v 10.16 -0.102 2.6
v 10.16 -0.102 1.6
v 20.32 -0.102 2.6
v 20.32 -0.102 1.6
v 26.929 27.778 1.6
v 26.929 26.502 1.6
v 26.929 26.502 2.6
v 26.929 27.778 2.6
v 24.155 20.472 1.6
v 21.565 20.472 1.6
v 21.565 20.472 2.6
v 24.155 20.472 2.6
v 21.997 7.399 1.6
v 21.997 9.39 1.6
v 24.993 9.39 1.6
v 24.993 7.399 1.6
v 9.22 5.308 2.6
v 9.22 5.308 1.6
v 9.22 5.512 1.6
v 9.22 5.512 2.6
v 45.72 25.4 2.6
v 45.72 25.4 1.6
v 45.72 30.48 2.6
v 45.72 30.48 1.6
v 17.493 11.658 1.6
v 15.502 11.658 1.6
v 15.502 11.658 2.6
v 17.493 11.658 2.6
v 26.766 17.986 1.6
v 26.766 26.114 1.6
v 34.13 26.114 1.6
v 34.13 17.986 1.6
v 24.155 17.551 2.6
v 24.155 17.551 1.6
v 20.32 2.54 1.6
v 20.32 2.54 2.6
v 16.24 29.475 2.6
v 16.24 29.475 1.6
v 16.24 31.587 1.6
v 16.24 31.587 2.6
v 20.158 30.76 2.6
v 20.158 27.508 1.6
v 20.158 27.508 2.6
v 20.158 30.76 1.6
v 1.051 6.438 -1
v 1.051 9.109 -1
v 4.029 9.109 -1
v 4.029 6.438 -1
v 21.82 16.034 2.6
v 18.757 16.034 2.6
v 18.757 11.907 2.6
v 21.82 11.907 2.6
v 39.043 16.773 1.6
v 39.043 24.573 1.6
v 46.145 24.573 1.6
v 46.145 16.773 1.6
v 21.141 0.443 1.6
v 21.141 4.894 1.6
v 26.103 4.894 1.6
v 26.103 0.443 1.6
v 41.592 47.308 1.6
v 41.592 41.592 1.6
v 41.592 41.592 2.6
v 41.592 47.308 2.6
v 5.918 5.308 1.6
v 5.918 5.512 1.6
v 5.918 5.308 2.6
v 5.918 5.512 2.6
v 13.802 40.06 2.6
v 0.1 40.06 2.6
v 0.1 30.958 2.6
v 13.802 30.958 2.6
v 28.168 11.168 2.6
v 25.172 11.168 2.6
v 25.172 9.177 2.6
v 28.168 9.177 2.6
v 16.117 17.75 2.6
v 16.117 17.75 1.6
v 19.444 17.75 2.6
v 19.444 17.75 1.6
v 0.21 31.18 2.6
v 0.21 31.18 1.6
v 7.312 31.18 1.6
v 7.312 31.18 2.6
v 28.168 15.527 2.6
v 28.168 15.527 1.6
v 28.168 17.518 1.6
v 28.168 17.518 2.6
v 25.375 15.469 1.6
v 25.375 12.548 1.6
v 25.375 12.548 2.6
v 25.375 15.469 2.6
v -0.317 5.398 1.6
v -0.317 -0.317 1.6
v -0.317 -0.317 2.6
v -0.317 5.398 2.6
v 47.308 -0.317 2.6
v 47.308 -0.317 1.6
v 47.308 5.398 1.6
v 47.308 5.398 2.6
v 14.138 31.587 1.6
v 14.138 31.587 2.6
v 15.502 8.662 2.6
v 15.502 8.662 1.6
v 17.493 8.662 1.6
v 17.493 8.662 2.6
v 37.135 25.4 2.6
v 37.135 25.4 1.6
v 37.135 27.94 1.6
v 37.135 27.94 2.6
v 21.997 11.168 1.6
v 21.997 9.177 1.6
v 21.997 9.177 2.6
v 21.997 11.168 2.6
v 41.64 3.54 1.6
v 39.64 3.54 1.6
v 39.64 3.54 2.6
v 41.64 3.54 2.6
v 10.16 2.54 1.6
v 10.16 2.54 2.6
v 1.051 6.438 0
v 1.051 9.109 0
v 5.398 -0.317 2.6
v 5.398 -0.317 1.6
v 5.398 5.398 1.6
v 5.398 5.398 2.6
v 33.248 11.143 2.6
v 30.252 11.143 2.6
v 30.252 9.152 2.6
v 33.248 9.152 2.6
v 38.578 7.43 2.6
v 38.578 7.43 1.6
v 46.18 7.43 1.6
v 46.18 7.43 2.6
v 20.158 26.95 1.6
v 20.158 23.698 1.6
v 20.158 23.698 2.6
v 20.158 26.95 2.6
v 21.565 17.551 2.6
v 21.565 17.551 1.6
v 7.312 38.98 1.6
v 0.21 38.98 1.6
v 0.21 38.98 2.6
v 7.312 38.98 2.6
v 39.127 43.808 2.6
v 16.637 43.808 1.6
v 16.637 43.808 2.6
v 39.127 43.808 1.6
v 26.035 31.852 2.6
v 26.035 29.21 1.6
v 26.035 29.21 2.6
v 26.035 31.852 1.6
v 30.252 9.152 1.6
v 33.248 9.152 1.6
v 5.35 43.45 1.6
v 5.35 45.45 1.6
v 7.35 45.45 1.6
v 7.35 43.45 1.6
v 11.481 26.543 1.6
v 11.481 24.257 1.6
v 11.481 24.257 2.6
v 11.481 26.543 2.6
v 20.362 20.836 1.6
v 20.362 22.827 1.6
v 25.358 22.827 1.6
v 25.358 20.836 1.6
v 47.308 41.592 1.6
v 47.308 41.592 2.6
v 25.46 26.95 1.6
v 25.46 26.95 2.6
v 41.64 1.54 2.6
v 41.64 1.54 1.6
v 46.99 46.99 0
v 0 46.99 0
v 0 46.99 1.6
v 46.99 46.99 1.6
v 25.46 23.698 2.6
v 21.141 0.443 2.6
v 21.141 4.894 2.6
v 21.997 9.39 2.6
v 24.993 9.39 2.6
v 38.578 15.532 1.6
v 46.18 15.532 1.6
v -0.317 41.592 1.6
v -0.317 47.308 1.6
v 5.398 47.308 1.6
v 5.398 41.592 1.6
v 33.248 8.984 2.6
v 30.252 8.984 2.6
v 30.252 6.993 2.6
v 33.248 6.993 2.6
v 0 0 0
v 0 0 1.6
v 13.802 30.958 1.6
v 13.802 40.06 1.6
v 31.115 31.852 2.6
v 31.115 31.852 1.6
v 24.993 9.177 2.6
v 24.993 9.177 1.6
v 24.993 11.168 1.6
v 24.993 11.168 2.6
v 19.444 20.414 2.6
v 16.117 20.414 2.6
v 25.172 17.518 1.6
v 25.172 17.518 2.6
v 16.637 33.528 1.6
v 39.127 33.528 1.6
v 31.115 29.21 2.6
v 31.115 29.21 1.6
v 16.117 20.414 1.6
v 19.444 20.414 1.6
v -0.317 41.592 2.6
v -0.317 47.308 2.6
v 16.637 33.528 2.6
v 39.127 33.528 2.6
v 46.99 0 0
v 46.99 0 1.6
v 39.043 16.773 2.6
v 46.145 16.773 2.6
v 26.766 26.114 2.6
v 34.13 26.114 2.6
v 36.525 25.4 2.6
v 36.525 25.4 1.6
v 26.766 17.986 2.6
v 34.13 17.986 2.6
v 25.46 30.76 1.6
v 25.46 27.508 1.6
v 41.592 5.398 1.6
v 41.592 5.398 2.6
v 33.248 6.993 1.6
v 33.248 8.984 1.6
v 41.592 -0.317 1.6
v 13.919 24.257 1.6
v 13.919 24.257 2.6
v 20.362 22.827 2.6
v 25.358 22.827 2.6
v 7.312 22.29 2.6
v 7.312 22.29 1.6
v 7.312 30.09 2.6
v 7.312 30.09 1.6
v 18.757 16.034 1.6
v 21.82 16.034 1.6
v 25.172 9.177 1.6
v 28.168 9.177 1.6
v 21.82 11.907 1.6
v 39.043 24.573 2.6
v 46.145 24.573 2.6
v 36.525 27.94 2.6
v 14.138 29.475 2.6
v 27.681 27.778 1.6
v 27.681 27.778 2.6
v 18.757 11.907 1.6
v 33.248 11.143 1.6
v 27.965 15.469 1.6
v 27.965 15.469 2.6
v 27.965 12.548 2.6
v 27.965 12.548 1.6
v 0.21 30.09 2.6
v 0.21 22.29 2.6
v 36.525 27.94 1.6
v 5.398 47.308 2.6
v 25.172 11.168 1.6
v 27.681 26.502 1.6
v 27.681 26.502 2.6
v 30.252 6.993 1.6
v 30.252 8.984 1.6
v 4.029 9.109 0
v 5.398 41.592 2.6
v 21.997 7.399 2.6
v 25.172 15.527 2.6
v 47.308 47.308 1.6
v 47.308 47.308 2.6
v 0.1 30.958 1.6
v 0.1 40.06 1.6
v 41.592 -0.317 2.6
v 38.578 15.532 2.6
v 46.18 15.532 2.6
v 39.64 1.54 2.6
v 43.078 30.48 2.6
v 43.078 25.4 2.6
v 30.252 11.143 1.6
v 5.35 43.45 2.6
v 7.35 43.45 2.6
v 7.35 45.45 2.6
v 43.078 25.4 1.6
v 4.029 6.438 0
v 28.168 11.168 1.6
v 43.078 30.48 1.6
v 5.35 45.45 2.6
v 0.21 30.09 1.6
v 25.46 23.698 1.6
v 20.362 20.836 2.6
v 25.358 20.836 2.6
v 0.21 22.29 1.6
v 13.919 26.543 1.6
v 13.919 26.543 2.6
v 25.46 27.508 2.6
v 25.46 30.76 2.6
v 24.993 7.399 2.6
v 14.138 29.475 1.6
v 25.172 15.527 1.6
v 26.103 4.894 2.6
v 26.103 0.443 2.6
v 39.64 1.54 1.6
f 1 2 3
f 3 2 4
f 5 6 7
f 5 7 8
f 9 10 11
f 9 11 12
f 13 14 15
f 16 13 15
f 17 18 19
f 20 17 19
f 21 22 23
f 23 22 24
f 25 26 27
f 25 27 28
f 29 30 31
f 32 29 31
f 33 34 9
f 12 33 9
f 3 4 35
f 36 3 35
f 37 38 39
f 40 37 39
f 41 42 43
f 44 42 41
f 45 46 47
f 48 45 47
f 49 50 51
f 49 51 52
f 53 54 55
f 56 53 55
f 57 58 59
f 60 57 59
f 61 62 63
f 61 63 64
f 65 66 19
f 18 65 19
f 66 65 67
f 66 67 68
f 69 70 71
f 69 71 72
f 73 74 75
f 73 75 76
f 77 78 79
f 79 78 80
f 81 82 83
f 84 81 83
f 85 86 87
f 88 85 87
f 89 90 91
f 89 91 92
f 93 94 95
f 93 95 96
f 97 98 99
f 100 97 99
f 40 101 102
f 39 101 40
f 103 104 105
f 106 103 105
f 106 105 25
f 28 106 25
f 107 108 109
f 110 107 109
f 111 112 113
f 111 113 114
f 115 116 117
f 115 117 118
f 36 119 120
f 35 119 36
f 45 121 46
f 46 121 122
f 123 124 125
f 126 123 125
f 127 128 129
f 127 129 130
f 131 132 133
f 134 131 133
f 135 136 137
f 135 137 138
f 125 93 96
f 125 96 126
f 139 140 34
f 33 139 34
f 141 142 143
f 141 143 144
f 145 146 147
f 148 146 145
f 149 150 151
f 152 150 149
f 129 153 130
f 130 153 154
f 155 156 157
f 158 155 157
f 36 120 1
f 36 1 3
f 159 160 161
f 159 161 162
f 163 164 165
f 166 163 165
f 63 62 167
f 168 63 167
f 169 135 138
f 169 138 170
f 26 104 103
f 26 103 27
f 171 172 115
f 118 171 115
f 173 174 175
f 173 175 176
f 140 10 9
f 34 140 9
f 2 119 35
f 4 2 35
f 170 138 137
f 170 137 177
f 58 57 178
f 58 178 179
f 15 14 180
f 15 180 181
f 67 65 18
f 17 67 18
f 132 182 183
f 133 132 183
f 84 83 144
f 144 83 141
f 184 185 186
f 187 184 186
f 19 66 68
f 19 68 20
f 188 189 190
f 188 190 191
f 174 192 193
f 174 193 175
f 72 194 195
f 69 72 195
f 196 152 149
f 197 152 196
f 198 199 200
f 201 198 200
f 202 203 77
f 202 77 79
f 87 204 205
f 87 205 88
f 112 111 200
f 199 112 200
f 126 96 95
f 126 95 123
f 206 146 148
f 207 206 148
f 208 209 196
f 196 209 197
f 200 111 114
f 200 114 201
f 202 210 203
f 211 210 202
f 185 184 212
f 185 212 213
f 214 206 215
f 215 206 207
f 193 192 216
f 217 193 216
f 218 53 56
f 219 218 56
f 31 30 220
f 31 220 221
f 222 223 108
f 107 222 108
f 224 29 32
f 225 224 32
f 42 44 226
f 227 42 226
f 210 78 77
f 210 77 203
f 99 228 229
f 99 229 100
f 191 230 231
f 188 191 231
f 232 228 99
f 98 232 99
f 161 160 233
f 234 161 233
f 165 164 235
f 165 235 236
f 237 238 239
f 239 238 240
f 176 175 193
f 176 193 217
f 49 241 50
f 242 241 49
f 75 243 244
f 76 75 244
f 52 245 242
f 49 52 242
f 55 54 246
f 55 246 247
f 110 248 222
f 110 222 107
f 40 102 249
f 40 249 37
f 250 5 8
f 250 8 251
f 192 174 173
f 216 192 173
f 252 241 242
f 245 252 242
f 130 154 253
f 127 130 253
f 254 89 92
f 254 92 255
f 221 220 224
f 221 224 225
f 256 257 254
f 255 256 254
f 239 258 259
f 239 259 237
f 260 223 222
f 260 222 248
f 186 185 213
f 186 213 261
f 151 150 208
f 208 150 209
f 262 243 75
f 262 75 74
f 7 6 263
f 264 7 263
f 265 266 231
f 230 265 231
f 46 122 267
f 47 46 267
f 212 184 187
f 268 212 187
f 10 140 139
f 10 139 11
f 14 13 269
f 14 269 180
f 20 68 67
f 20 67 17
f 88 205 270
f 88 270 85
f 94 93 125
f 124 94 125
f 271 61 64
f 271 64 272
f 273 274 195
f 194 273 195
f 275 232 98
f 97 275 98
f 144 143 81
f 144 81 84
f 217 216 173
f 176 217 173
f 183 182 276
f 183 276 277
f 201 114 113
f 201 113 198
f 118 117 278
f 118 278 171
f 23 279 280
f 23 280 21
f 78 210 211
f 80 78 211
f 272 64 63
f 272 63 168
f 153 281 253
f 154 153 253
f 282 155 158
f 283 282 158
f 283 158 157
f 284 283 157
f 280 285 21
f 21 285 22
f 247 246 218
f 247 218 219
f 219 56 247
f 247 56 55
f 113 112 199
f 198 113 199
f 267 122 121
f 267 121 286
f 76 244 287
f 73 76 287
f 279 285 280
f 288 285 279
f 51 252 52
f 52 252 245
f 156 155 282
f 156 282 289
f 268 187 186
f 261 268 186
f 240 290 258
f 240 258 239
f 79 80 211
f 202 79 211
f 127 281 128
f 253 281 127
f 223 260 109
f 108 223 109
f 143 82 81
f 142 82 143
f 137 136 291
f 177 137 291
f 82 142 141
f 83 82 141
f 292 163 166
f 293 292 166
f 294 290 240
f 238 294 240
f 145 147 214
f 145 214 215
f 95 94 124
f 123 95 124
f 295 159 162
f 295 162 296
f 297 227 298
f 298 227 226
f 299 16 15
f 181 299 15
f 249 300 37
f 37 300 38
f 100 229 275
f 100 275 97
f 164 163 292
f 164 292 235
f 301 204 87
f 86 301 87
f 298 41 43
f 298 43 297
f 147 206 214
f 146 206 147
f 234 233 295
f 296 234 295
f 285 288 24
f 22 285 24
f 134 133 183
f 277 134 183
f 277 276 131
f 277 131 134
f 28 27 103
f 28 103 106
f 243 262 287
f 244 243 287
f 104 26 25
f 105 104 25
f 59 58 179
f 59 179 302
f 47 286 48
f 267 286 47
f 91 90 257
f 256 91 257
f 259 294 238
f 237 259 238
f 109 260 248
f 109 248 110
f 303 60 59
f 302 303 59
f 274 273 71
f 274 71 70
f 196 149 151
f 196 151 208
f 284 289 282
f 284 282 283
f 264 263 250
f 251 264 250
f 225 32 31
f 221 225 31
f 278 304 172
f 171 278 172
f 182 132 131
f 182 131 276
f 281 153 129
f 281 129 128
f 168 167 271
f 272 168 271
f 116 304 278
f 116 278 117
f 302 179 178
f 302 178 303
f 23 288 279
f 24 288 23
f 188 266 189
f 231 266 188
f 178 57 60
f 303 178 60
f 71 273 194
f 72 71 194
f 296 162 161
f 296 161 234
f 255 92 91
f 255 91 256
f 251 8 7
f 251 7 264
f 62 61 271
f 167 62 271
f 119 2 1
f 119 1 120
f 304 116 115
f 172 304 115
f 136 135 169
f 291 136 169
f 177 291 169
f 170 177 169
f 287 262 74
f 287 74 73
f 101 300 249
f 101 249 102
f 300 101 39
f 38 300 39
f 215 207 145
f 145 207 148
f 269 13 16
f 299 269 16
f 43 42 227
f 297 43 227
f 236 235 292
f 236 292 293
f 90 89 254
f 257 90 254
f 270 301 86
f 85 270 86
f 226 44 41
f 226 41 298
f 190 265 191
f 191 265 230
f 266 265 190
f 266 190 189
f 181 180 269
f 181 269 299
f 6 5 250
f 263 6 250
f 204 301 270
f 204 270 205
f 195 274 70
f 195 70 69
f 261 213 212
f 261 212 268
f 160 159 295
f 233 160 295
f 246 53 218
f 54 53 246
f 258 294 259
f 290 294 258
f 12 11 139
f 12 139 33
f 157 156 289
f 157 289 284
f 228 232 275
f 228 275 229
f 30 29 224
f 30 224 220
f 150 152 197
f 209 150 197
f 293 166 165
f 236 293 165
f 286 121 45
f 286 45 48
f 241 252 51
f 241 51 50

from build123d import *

# Parameters (mm, degrees)
SKETCH1_W                            = 46.99
SKETCH1_H                            = 46.99
BOARD_DEPTH                          = 1.6
SKETCH2_W                            = 3.327
SKETCH2_H                            = 2.6635
EXTRUDE_1210_1_DEPTH                 = 1
SKETCH3_W                            = 4.9968
SKETCH3_H                            = 1.9914
EXTRUDE_1206_1_DEPTH                 = 1
SKETCH4_W                            = 5.3016
SKETCH4_H                            = 3.2516
EIA3528_1_DEPTH                      = 1
SKETCH5_W                            = 5.3016
SKETCH5_H                            = 3.2516
EIA3528_2_DEPTH                      = 1
SKETCH6_W                            = 2.9968
SKETCH6_H                            = 1.9914
F_0603_CAP_1_DEPTH                   = 1
SKETCH7_W                            = 1.9914
SKETCH7_H                            = 2.9968
F_0603_CAP_2_DEPTH                   = 1
SKETCH8_W                            = 2.5908
SKETCH8_H                            = 2.921
SOT23_1_DEPTH                        = 1
SKETCH9_W                            = 2.5908
SKETCH9_H                            = 2.921
SOT23_2_DEPTH                        = 1
SKETCH10_W                           = 2
SKETCH10_H                           = 2
FIDUCIAL_1X2_1_DEPTH                 = 1
SKETCH11_W                           = 2
SKETCH11_H                           = 2
FIDUCIAL_1X2_2_DEPTH                 = 1
SKETCH14_W                           = 13.7016
SKETCH14_H                           = 9.1016
POWER_JACK_PTH_1_DEPTH               = 1
SKETCH15_W                           = 7.6016
SKETCH15_H                           = 8.1016
JST_2_SMD_1_DEPTH                    = 1
SKETCH16_W                           = 10.16
SKETCH16_H                           = 2.6416
EXTRUDE_1X04_1_DEPTH                 = 1
SKETCH17_W                           = 2.6416
SKETCH17_H                           = 5.08
EXTRUDE_1X02_1_DEPTH                 = 1
SKETCH18_W                           = 7.1016
SKETCH18_H                           = 7.8
SCREWTERMINAL_3_5MM_2_1_DEPTH        = 1
SKETCH19_W                           = 7.1016
SKETCH19_H                           = 7.8
SCREWTERMINAL_3_5MM_2_2_DEPTH        = 1
SKETCH20_W                           = 7.1016
SKETCH20_H                           = 7.8
SCREWTERMINAL_3_5MM_2_3_DEPTH        = 1
SKETCH21_W                           = 2.4384
SKETCH21_H                           = 2.286
SJ_2S_1_DEPTH                        = 1
SKETCH22_W                           = 2.1016
SKETCH22_H                           = 2.1115
SJ_2S_NO_1_DEPTH                     = 1
SKETCH23_W                           = 0.6096
SKETCH23_H                           = 2.54
PTH_JUMPER_NC_BOTTOM_NO_SILK_1_DEPTH = 1
SKETCH24_W                           = 5.08
SKETCH24_H                           = 2.6416
EXTRUDE_1X02_2_DEPTH                 = 1
SKETCH25_W                           = 7.3635
SKETCH25_H                           = 8.127
CR75_1_DEPTH                         = 1
SKETCH26_W                           = 22.49
SKETCH26_H                           = 10.28
SFE_LOGO_NAME_FLAME_2_1_DEPTH        = 1
SKETCH27_W                           = 4.9628
SKETCH27_H                           = 4.4514
OSHW_LOGO_M_1_DEPTH                  = 1
SKETCH28_W                           = 2.9776
SKETCH28_H                           = 2.6708
OSHW_LOGO_S_1_DEPTH                  = 1
SKETCH30_W                           = 0.7524
SKETCH30_H                           = 1.2762
EXTRUDE_0805_1_DEPTH                 = 1
SKETCH31_W                           = 2.9968
SKETCH31_H                           = 1.9914
F_0603_RES_1_DEPTH                   = 1
SKETCH32_W                           = 2.9968
SKETCH32_H                           = 1.9914
F_0603_RES_2_DEPTH                   = 1
SKETCH33_W                           = 2.9968
SKETCH33_H                           = 1.9914
F_0603_RES_3_DEPTH                   = 1
SKETCH34_W                           = 2.9968
SKETCH34_H                           = 1.9914
F_0603_RES_4_DEPTH                   = 1
SKETCH35_W                           = 2.9968
SKETCH35_H                           = 1.9914
F_0603_RES_5_DEPTH                   = 1
SKETCH36_W                           = 3.3016
SKETCH36_H                           = 0.2032
TRIMPOT_3MM_1_DEPTH                  = 1
SKETCH37_W                           = 5.715
SKETCH37_H                           = 5.715
STAND_OFF_1_DEPTH                    = 1
SKETCH38_W                           = 5.715
SKETCH38_H                           = 5.715
STAND_OFF_2_DEPTH                    = 1
SKETCH39_W                           = 5.715
SKETCH39_H                           = 5.715
STAND_OFF_3_DEPTH                    = 1
SKETCH40_W                           = 5.715
SKETCH40_H                           = 5.715
STAND_OFF_4_DEPTH                    = 1
SKETCH41_W                           = 3.0635
SKETCH41_H                           = 4.127
MSOP_12_GND_1_DEPTH                  = 1


with BuildPart() as part:
    # Sketch1 → BOARD (new body)
    with BuildSketch(Plane.XY):
        with Locations((23.495, 23.495)):
            Rectangle(SKETCH1_W, SKETCH1_H)
    extrude(amount=BOARD_DEPTH)


with BuildPart() as body_2:
    # Sketch2 → 1210-1 (new body)
    with BuildSketch(Plane.XY.offset(1.6)):
        with Locations((17.78, 19.08175)):
            Rectangle(SKETCH2_W, SKETCH2_H)
    extrude(amount=EXTRUDE_1210_1_DEPTH)


with BuildPart() as body_3:
    # Sketch3 → 1206-1 (new body)
    with BuildSketch(Plane.XY.offset(1.6)):
        with Locations((22.86, 21.8313)):
            Rectangle(SKETCH3_W, SKETCH3_H)
    extrude(amount=EXTRUDE_1206_1_DEPTH)


with BuildPart() as body_4:
    # Sketch4 → EIA3528-1 (new body)
    with BuildSketch(Plane.XY.offset(1.6)):
        with Locations((22.8092, 29.1342)):
            Rectangle(SKETCH4_W, SKETCH4_H)
    extrude(amount=EIA3528_1_DEPTH)


with BuildPart() as body_5:
    # Sketch5 → EIA3528-2 (new body)
    with BuildSketch(Plane.XY.offset(1.6)):
        with Locations((22.8092, 25.3242)):
            Rectangle(SKETCH5_W, SKETCH5_H)
    extrude(amount=EIA3528_2_DEPTH)


with BuildPart() as body_6:
    # Sketch6 → 0603-CAP-1 (new body)
    with BuildSketch(Plane.XY.offset(1.6)):
        with Locations((26.67, 16.5227)):
            Rectangle(SKETCH6_W, SKETCH6_H)
    extrude(amount=F_0603_CAP_1_DEPTH)


with BuildPart() as body_7:
    # Sketch7 → 0603-CAP-2 (new body)
    with BuildSketch(Plane.XY.offset(1.6)):
        with Locations((16.4973, 10.16)):
            Rectangle(SKETCH7_W, SKETCH7_H)
    extrude(amount=F_0603_CAP_2_DEPTH)


with BuildPart() as body_8:
    # Sketch8 → SOT23-1 (new body)
    with BuildSketch(Plane.XY.offset(1.6)):
        with Locations((22.86, 19.0119)):
            Rectangle(SKETCH8_W, SKETCH8_H)
    extrude(amount=SOT23_1_DEPTH)


with BuildPart() as body_9:
    # Sketch9 → SOT23-2 (new body)
    with BuildSketch(Plane.XY.offset(1.6)):
        with Locations((26.67, 14.0081)):
            Rectangle(SKETCH9_W, SKETCH9_H)
    extrude(amount=SOT23_2_DEPTH)


with BuildPart() as body_10:
    # Sketch10 → FIDUCIAL-1X2-1 (new body)
    with BuildSketch(Plane.XY.offset(1.6)):
        with Locations((6.35, 44.45)):
            Rectangle(SKETCH10_W, SKETCH10_H)
    extrude(amount=FIDUCIAL_1X2_1_DEPTH)


with BuildPart() as body_11:
    # Sketch11 → FIDUCIAL-1X2-2 (new body)
    with BuildSketch(Plane.XY.offset(1.6)):
        with Locations((40.64, 2.54)):
            Rectangle(SKETCH11_W, SKETCH11_H)
    extrude(amount=FIDUCIAL_1X2_2_DEPTH)


with BuildPart() as body_12:
    # Sketch14 → POWER_JACK_PTH-1 (new body)
    with BuildSketch(Plane.XY.offset(1.6)):
        with Locations((6.9508, 35.5092)):
            Rectangle(SKETCH14_W, SKETCH14_H)
    extrude(amount=POWER_JACK_PTH_1_DEPTH)


with BuildPart() as body_13:
    # Sketch15 → JST-2-SMD-1 (new body)
    with BuildSketch(Plane.XY.offset(1.6)):
        with Locations((42.3792, 11.4808)):
            Rectangle(SKETCH15_W, SKETCH15_H)
    extrude(amount=JST_2_SMD_1_DEPTH)


with BuildPart() as body_14:
    # Sketch16 → 1X04-1 (new body)
    with BuildSketch(Plane.XY.offset(1.6)):
        with Locations((15.24, 1.2192)):
            Rectangle(SKETCH16_W, SKETCH16_H)
    extrude(amount=EXTRUDE_1X04_1_DEPTH)


with BuildPart() as body_15:
    # Sketch17 → 1X02-1 (new body)
    with BuildSketch(Plane.XY.offset(1.6)):
        with Locations((44.3992, 27.94)):
            Rectangle(SKETCH17_W, SKETCH17_H)
    extrude(amount=EXTRUDE_1X02_1_DEPTH)


with BuildPart() as body_16:
    # Sketch18 → SCREWTERMINAL-3_5MM-2-1 (new body)
    with BuildSketch(Plane.XY.offset(1.6)):
        with Locations((42.5942, 20.673)):
            Rectangle(SKETCH18_W, SKETCH18_H)
    extrude(amount=SCREWTERMINAL_3_5MM_2_1_DEPTH)


with BuildPart() as body_17:
    # Sketch19 → SCREWTERMINAL-3_5MM-2-2 (new body)
    with BuildSketch(Plane.XY.offset(1.6)):
        with Locations((3.7608, 35.08)):
            Rectangle(SKETCH19_W, SKETCH19_H)
    extrude(amount=SCREWTERMINAL_3_5MM_2_2_DEPTH)


with BuildPart() as body_18:
    # Sketch20 → SCREWTERMINAL-3_5MM-2-3 (new body)
    with BuildSketch(Plane.XY.offset(1.6)):
        with Locations((3.7608, 26.19)):
            Rectangle(SKETCH20_W, SKETCH20_H)
    extrude(amount=SCREWTERMINAL_3_5MM_2_3_DEPTH)


with BuildPart() as body_19:
    # Sketch21 → SJ_2S-1 (new body)
    with BuildSketch(Plane.XY.offset(1.6)):
        with Locations((12.7, 25.4)):
            Rectangle(SKETCH21_W, SKETCH21_H)
    extrude(amount=SJ_2S_1_DEPTH)


with BuildPart() as body_20:
    # Sketch22 → SJ_2S-NO-1 (new body)
    with BuildSketch(Plane.XY.offset(1.6)):
        with Locations((15.1892, 30.5308)):
            Rectangle(SKETCH22_W, SKETCH22_H)
    extrude(amount=SJ_2S_NO_1_DEPTH)


with BuildPart() as body_21:
    # Sketch23 → PTH-JUMPER-NC_BOTTOM_NO_SILK-1 (new body)
    with BuildSketch(Plane.XY.offset(1.6)):
        with Locations((36.83, 26.67)):
            Rectangle(SKETCH23_W, SKETCH23_H)
    extrude(amount=PTH_JUMPER_NC_BOTTOM_NO_SILK_1_DEPTH)


with BuildPart() as body_22:
    # Sketch24 → 1X02-2 (new body)
    with BuildSketch(Plane.XY.offset(1.6)):
        with Locations((28.575, 30.5308)):
            Rectangle(SKETCH24_W, SKETCH24_H)
    extrude(amount=EXTRUDE_1X02_2_DEPTH)


with BuildPart() as body_23:
    # Sketch25 → CR75-1 (new body)
    with BuildSketch(Plane.XY.offset(1.6)):
        with Locations((30.44825, 22.05)):
            Rectangle(SKETCH25_W, SKETCH25_H)
    extrude(amount=CR75_1_DEPTH)


with BuildPart() as body_24:
    # Sketch26 → SFE_LOGO_NAME_FLAME__2-1 (new body)
    with BuildSketch(Plane.XY.offset(1.6)):
        with Locations((27.882, 38.668)):
            Rectangle(SKETCH26_W, SKETCH26_H)
    extrude(amount=SFE_LOGO_NAME_FLAME_2_1_DEPTH)


with BuildPart() as body_25:
    # Sketch27 → OSHW-LOGO-M-1 (new body)
    with BuildSketch(Plane.XY.offset(1.6)):
        with Locations((23.622, 2.6687)):
            Rectangle(SKETCH27_W, SKETCH27_H)
    extrude(amount=OSHW_LOGO_M_1_DEPTH)


with BuildPart() as body_26:
    # Sketch28 → OSHW-LOGO-S-1 (new body)
    with BuildSketch(Plane.XY):
        with Locations((2.54, 7.7734)):
            Rectangle(SKETCH28_W, SKETCH28_H)
    extrude(amount=-OSHW_LOGO_S_1_DEPTH)


with BuildPart() as body_27:
    # Sketch30 → 0805-1 (new body)
    with BuildSketch(Plane.XY.offset(1.6)):
        with Locations((27.305, 27.1399)):
            Rectangle(SKETCH30_W, SKETCH30_H)
    extrude(amount=EXTRUDE_0805_1_DEPTH)


with BuildPart() as body_28:
    # Sketch31 → 0603-RES-1 (new body)
    with BuildSketch(Plane.XY.offset(1.6)):
        with Locations((26.67, 10.1727)):
            Rectangle(SKETCH31_W, SKETCH31_H)
    extrude(amount=F_0603_RES_1_DEPTH)


with BuildPart() as body_29:
    # Sketch32 → 0603-RES-2 (new body)
    with BuildSketch(Plane.XY.offset(1.6)):
        with Locations((23.495, 8.3947)):
            Rectangle(SKETCH32_W, SKETCH32_H)
    extrude(amount=F_0603_RES_2_DEPTH)


with BuildPart() as body_30:
    # Sketch33 → 0603-RES-3 (new body)
    with BuildSketch(Plane.XY.offset(1.6)):
        with Locations((23.495, 10.1727)):
            Rectangle(SKETCH33_W, SKETCH33_H)
    extrude(amount=F_0603_RES_3_DEPTH)


with BuildPart() as body_31:
    # Sketch34 → 0603-RES-4 (new body)
    with BuildSketch(Plane.XY.offset(1.6)):
        with Locations((31.75, 10.1473)):
            Rectangle(SKETCH34_W, SKETCH34_H)
    extrude(amount=F_0603_RES_4_DEPTH)


with BuildPart() as body_32:
    # Sketch35 → 0603-RES-5 (new body)
    with BuildSketch(Plane.XY.offset(1.6)):
        with Locations((31.75, 7.9883)):
            Rectangle(SKETCH35_W, SKETCH35_H)
    extrude(amount=F_0603_RES_5_DEPTH)


with BuildPart() as body_33:
    # Sketch36 → TRIMPOT-3MM-1 (new body)
    with BuildSketch(Plane.XY.offset(1.6)):
        with Locations((7.5692, 5.41)):
            Rectangle(SKETCH36_W, SKETCH36_H)
    extrude(amount=TRIMPOT_3MM_1_DEPTH)


with BuildPart() as body_34:
    # Sketch37 → STAND-OFF-1 (new body)
    with BuildSketch(Plane.XY.offset(1.6)):
        with Locations((2.54, 2.54)):
            Rectangle(SKETCH37_W, SKETCH37_H)
    extrude(amount=STAND_OFF_1_DEPTH)


with BuildPart() as body_35:
    # Sketch38 → STAND-OFF-2 (new body)
    with BuildSketch(Plane.XY.offset(1.6)):
        with Locations((2.54, 44.45)):
            Rectangle(SKETCH38_W, SKETCH38_H)
    extrude(amount=STAND_OFF_2_DEPTH)


with BuildPart() as body_36:
    # Sketch39 → STAND-OFF-3 (new body)
    with BuildSketch(Plane.XY.offset(1.6)):
        with Locations((44.45, 44.45)):
            Rectangle(SKETCH39_W, SKETCH39_H)
    extrude(amount=STAND_OFF_3_DEPTH)


with BuildPart() as body_37:
    # Sketch40 → STAND-OFF-4 (new body)
    with BuildSketch(Plane.XY.offset(1.6)):
        with Locations((44.45, 2.54)):
            Rectangle(SKETCH40_W, SKETCH40_H)
    extrude(amount=STAND_OFF_4_DEPTH)


with BuildPart() as body_38:
    # Sketch41 → MSOP-12_GND-1 (new body)
    with BuildSketch(Plane.XY.offset(1.6)):
        with Locations((20.28825, 13.97)):
            Rectangle(SKETCH41_W, SKETCH41_H)
    extrude(amount=MSOP_12_GND_1_DEPTH)


solid = Compound([part.part, body_2.part, body_3.part, body_4.part, body_5.part, body_6.part, body_7.part, body_8.part, body_9.part, body_10.part, body_11.part, body_12.part, body_13.part, body_14.part, body_15.part, body_16.part, body_17.part, body_18.part, body_19.part, body_20.part, body_21.part, body_22.part, body_23.part, body_24.part, body_25.part, body_26.part, body_27.part, body_28.part, body_29.part, body_30.part, body_31.part, body_32.part, body_33.part, body_34.part, body_35.part, body_36.part, body_37.part, body_38.part])
